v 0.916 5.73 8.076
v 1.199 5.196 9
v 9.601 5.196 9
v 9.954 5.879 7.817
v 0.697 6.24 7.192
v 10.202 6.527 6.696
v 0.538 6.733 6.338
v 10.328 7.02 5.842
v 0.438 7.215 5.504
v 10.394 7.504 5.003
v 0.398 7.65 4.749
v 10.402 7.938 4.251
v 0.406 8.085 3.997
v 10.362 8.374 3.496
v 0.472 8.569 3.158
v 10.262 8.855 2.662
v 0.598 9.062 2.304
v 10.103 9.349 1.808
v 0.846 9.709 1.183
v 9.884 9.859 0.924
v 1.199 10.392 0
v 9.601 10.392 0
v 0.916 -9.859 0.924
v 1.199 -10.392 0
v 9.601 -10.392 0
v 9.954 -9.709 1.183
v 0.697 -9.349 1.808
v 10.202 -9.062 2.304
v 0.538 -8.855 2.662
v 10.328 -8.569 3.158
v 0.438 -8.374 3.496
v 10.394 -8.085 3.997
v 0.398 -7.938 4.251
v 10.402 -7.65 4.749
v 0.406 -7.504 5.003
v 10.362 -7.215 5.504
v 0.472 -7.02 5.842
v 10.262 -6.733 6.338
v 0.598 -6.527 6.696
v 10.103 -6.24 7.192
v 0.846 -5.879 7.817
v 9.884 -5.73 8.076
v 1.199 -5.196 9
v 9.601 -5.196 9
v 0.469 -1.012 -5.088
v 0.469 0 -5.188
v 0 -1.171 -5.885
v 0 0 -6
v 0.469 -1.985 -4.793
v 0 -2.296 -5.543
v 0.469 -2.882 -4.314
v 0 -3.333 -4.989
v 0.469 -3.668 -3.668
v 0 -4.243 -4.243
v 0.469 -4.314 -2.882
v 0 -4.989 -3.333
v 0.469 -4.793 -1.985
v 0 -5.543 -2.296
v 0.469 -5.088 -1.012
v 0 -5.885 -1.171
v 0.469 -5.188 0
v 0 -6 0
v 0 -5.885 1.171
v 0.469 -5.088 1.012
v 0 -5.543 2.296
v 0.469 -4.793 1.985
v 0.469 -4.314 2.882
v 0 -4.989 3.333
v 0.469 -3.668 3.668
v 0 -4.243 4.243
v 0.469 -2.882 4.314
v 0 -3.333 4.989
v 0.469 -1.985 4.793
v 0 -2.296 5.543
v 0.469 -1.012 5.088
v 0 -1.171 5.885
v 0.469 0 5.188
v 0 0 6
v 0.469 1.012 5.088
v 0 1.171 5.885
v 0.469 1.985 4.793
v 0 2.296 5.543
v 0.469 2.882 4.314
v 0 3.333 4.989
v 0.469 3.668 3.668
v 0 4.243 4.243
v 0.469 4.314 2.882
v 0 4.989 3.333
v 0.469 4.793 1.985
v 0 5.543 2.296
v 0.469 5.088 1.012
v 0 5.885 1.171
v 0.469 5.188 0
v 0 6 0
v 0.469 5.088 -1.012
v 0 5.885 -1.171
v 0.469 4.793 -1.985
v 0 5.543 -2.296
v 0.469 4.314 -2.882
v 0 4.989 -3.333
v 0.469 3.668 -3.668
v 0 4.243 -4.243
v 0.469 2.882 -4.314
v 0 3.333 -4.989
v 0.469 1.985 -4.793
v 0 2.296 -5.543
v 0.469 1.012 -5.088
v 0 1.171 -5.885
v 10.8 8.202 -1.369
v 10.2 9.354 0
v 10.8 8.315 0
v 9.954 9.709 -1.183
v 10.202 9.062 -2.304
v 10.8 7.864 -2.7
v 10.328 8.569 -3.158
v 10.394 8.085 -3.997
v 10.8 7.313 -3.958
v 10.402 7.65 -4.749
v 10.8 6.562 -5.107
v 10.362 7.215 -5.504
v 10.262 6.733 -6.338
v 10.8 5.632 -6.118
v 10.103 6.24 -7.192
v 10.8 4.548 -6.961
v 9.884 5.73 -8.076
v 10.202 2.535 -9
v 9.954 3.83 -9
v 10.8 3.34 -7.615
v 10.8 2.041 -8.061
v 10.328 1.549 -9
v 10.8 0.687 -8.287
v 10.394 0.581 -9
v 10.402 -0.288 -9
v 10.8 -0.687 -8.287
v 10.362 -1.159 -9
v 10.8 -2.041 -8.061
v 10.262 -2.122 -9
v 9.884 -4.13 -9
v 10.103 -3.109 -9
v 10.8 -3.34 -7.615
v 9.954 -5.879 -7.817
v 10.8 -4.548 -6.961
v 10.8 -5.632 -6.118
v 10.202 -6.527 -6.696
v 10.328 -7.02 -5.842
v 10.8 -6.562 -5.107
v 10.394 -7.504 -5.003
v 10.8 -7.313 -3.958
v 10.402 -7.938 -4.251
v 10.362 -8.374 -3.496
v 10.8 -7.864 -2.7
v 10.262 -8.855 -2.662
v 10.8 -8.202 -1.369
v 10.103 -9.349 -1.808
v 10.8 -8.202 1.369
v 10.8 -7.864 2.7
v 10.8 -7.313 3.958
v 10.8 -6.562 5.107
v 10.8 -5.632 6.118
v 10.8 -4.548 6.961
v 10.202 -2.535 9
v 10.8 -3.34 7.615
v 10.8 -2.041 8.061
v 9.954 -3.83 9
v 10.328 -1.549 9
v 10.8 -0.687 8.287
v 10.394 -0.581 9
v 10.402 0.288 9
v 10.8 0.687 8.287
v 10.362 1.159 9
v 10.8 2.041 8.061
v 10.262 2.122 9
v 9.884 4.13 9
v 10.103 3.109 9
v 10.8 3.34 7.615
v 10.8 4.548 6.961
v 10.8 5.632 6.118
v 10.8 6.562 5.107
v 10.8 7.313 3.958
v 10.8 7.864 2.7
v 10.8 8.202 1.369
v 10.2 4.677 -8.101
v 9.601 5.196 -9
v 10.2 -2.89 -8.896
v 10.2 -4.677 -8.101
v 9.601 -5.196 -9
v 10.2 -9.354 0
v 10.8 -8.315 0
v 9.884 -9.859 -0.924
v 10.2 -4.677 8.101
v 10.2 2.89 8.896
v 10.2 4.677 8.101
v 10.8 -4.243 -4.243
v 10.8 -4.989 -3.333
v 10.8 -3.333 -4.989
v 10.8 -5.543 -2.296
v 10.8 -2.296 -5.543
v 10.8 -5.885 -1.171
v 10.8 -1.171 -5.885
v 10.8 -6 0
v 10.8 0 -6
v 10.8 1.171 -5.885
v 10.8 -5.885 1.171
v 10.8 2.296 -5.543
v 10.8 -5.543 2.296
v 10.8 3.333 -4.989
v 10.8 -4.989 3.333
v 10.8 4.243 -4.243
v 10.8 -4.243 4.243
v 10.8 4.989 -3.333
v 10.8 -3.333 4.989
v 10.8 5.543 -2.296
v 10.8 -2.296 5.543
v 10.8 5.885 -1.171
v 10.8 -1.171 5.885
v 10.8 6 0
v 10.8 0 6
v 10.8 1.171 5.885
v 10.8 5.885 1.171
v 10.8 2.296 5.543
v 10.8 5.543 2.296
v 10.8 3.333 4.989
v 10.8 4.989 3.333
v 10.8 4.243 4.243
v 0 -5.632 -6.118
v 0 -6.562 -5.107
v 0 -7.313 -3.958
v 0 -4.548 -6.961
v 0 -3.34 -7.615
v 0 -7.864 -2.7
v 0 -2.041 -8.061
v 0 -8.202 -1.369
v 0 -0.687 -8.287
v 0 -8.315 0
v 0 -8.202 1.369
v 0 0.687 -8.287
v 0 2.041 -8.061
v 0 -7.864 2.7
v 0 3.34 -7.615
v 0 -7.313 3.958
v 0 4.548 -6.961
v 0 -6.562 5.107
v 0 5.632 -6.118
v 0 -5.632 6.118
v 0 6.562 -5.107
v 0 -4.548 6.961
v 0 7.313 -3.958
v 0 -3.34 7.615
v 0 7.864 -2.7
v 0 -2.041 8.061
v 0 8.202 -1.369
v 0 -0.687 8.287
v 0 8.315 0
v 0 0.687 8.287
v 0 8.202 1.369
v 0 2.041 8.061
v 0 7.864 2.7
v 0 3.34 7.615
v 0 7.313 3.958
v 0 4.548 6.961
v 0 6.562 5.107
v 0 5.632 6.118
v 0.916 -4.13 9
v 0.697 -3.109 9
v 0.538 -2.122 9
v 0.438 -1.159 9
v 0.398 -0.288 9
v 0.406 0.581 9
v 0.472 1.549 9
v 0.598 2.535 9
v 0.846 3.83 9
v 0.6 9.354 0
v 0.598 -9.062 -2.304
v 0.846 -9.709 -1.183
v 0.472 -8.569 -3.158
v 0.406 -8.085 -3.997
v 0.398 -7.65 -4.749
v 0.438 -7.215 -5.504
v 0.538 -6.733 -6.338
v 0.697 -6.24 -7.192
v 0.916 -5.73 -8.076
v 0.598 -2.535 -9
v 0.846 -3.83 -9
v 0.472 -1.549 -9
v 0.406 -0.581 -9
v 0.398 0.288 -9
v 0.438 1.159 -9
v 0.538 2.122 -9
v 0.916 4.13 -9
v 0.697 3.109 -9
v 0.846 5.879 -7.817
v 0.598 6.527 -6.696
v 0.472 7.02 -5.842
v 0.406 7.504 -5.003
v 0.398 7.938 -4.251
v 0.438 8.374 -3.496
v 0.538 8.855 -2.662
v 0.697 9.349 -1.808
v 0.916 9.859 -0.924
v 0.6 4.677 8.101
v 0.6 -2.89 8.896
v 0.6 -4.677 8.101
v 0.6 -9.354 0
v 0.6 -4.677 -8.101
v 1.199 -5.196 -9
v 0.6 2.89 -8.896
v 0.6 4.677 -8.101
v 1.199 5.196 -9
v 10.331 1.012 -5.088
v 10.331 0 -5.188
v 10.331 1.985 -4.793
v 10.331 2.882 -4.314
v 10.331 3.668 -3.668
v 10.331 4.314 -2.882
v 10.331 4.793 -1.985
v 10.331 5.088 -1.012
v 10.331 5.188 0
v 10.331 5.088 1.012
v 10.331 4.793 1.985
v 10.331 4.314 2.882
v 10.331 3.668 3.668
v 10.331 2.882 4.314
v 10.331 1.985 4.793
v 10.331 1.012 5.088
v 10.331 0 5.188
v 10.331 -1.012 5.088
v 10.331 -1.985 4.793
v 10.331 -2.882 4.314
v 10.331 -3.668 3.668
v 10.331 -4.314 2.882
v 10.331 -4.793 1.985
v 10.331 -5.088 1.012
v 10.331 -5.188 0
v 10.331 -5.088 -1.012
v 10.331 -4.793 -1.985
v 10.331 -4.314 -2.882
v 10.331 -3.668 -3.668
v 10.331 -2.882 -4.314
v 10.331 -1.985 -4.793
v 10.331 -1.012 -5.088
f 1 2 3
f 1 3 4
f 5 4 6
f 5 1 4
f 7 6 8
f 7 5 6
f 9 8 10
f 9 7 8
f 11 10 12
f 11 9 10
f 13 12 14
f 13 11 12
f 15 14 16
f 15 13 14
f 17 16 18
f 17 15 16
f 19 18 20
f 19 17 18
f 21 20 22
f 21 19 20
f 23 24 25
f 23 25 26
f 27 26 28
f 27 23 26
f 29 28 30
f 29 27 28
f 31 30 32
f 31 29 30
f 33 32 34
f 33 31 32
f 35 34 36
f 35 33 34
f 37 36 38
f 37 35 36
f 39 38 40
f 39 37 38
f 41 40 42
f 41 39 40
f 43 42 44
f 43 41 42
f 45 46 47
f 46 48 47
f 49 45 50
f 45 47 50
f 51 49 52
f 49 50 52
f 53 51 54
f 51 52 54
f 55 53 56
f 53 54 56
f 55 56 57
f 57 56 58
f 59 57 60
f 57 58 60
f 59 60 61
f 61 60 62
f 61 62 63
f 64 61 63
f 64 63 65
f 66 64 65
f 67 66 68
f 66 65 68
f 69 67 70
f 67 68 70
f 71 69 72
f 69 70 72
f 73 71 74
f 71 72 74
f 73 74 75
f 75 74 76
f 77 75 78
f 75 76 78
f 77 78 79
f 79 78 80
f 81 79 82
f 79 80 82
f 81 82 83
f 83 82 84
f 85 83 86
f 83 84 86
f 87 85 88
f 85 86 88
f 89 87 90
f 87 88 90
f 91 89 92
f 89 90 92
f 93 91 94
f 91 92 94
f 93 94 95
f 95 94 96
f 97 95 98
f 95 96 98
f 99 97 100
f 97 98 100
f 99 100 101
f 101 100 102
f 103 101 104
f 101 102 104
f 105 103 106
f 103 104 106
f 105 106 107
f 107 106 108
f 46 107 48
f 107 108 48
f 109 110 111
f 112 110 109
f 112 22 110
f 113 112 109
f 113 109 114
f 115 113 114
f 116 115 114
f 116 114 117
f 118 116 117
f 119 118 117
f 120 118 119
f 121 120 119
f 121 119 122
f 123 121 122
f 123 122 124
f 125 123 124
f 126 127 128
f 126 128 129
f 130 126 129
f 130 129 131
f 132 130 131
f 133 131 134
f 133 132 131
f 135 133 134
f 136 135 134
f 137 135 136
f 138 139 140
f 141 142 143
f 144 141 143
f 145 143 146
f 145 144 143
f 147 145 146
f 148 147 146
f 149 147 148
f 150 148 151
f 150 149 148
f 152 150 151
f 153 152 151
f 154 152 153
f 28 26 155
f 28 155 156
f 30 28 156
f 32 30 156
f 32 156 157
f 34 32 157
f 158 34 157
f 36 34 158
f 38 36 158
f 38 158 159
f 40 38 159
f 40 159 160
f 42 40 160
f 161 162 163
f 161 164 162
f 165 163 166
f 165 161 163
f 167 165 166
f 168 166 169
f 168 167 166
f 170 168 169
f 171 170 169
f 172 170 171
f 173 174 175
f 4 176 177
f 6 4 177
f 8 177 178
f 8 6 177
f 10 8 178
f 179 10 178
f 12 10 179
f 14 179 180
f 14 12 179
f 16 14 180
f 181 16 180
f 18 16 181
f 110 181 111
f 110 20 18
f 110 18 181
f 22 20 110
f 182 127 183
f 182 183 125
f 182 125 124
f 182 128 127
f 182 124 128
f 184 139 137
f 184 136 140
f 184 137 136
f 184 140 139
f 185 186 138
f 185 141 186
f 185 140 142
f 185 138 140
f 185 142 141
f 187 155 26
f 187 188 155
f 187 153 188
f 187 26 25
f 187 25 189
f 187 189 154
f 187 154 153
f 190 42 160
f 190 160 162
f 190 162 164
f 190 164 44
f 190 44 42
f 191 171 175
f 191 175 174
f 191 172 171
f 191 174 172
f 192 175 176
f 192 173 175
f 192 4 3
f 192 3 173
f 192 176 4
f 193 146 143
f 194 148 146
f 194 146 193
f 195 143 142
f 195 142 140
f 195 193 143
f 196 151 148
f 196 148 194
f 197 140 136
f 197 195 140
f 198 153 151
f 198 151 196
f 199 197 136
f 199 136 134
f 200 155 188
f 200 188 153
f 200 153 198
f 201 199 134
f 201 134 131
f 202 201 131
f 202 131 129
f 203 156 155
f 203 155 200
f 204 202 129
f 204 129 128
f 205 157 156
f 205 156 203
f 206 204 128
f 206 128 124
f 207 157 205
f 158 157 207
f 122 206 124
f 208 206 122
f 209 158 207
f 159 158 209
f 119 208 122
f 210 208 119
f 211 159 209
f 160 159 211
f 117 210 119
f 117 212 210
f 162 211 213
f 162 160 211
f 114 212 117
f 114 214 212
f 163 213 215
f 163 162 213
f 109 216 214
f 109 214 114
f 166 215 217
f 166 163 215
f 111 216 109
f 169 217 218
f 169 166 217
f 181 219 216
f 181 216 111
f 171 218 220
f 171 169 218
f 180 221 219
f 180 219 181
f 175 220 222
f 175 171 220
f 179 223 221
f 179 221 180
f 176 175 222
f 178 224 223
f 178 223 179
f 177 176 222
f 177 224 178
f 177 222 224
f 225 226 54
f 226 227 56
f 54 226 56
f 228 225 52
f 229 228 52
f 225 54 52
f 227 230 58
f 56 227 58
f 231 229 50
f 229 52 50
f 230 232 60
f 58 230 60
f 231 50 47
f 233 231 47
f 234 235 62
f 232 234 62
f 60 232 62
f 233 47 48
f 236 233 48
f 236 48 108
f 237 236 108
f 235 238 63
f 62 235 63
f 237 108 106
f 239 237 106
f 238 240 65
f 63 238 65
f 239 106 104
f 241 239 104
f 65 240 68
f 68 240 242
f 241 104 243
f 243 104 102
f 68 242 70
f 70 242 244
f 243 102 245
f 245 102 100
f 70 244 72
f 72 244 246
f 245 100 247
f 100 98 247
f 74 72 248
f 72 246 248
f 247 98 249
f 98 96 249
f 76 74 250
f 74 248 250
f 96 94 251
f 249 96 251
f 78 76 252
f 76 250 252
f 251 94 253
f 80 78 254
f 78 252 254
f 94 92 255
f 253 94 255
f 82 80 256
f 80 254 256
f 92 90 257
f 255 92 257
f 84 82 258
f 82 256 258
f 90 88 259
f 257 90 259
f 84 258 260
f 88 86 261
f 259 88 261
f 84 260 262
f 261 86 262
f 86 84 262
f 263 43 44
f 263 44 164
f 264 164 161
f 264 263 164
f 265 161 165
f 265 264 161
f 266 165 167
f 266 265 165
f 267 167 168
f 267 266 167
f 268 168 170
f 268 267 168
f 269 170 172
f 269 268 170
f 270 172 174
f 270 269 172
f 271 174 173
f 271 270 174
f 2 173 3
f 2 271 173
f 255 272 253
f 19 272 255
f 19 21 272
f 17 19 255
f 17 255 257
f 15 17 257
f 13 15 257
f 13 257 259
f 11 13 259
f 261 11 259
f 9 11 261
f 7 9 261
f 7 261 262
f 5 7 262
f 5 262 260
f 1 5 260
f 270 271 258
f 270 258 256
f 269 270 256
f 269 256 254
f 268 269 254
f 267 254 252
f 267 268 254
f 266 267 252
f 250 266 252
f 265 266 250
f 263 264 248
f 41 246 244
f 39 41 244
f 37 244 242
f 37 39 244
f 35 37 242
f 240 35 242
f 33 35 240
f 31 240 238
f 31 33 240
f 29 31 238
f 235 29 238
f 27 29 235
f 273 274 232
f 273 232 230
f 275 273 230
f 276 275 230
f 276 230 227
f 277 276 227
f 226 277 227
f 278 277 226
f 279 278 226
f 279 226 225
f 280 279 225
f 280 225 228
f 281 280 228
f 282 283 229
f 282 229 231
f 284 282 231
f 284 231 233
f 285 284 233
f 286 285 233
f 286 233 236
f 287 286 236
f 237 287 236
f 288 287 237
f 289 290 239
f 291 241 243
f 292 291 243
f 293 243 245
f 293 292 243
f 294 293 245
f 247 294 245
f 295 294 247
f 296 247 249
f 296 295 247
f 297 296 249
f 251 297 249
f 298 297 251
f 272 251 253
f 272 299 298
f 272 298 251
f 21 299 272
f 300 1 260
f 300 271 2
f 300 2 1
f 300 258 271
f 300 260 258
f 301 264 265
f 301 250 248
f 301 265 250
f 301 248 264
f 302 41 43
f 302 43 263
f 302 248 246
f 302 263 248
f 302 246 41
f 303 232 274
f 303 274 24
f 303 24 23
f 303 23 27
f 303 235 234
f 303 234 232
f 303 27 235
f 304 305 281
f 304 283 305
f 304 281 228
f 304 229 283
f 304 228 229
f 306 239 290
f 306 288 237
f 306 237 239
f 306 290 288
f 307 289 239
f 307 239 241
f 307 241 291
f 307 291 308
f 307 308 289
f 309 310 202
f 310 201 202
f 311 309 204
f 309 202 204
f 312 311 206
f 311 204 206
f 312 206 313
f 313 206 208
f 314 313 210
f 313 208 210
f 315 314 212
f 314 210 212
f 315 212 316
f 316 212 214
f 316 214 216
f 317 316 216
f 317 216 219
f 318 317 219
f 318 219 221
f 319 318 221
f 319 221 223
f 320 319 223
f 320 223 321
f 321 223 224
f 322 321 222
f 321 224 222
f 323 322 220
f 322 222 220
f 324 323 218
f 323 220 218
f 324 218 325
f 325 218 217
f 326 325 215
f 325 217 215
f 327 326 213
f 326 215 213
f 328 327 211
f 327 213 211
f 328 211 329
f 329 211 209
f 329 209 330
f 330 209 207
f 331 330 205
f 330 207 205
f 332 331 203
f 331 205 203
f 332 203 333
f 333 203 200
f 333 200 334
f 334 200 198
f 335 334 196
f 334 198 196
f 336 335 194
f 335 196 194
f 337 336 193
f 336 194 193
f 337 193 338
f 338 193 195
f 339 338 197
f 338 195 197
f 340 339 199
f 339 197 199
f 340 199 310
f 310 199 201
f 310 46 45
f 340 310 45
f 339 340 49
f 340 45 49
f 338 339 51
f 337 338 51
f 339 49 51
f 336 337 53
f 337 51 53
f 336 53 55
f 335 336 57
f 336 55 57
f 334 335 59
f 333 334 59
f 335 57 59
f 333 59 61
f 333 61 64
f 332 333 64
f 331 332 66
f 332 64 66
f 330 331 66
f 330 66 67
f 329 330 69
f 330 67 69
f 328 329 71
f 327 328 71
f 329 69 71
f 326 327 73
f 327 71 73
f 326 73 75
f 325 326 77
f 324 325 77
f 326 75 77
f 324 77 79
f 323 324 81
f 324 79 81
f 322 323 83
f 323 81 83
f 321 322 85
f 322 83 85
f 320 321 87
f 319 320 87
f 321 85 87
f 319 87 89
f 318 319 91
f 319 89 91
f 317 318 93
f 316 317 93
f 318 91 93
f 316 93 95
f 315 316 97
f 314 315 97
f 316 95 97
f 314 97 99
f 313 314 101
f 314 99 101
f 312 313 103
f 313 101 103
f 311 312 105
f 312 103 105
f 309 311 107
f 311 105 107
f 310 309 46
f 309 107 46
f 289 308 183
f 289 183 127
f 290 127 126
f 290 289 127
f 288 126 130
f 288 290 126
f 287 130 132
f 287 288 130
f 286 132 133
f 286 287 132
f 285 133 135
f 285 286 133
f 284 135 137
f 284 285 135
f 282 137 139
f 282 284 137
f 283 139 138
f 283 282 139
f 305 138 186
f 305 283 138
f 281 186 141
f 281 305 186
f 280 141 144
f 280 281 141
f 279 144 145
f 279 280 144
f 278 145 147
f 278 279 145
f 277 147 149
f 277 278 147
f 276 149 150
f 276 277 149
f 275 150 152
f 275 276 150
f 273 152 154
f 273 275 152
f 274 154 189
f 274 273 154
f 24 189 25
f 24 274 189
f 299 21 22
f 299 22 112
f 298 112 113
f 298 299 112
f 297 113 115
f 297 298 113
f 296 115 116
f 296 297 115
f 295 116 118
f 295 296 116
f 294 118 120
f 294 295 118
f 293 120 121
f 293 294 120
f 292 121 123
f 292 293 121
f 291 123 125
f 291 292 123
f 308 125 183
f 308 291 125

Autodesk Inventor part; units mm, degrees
ref_plane "YZ Plane" through (0, 0, 0) normal (1, 0, 0) x (0, 1, 0)
ref_plane "XZ Plane" through (0, 0, 0) normal (0, 1, 0) x (-1, 0, 0)
sketch "Эскиз1" plane through (0, 0, 0) normal (1, 0, 0) x (0, 1, 0)
  line L0 (-10.3923, 0) -> (-5.1962, 9)
  line L1 (-5.1962, 9) -> (5.1962, 9)
  line L2 (5.1962, 9) -> (10.3923, 0)
  line L3 (10.3923, 0) -> (5.1962, -9)
  line L4 (5.1962, -9) -> (-5.1962, -9)
  line L5 (-5.1962, -9) -> (-10.3923, 0)
  point P0 (0, 0)
  point P1 (0, 0)
  dimension "d0" = 20.7846
extrude "Базовый элемент" add sketch "Эскиз1" along normal blind 10.8
sketch "Эскиз2" plane through (0, 0, 0) normal (0, 0, 1) x (1, 0, 0)
  line L0 (0, 5.1962) -> (0, 10.3923) projected
  line L1 (0, 10.3923) -> (10.8, 10.3923) projected
  line L2 (10.8, 5.1962) -> (10.8, 10.3923) projected
  line L3 (-2.16, 0) -> (12.96, 0) projected
  line L4 (1.1993, 10.3923) -> (0, 8.315)
  line L5 (9.6007, 10.3923) -> (10.8, 8.315)
  dimension "d3" = 30
  dimension "d4" = 30
  dimension "d5" = 16.63
  dimension "d6" = 16.63
revolve "Фаска1" cut sketch "Эскиз2" angle 360 about axis through (-10, 0, 0) along (1, 0, 0)
sketch "Эскиз3" plane through (10.8, 0, 0) normal (1, 0, 0) x (0, 0, -1)
  arc A0 (-0.625, -1.0825) -> (0.625, -1.0825) centre (0, 0) ccw projected
hole "Резьба" at (10.8, 0, 0) direction (-1, 0, 0) diameter 10.376 end through all thread size "M12x1.5" class "6H" standard "ISO Metric profile"
chamfer "Фаска2" distance 0.8119 angle 30 1 edges at (10.8, 0, 5.188) measured on face at (10.8, 7.1795, -0.8718)
chamfer "Фаска3" distance 0.8119 angle 30 1 edges at (0, 0, 5.188) measured on face at (0, 7.1795, -0.8718)
ref_plane "Work Plane1" through (-18.9656, 0, 0) normal (0, -0.8660254, -0.5) x (1, 0, 0)
equation "\"d0\" = 1.1547 * SW"
equation "\"d1\" = KOH"
equation "\"d3\" = ANG1"
equation "\"d4\" = ANG2"
equation "\"d5\" = SW0"
equation "\"d6\" = SW01"
equation "\"d8\" = -0.5 * GD1 + 0.5 * NND"
equation "\"d40\" = -0.5 * GD1 + 0.5 * NND"
equation "\"d10\" = -0.5 * GD1 + 0.5 * NND"
equation "\"d41\" = -0.5 * GD1 + 0.5 * NND"
equation "\"ANG1\" = 30deg"
equation "\"ANG2\" = 30deg"
equation "\"NND\" = 12"
equation "\"KOH\" = 10.8"
equation "\"SW\" = 18"
equation "\"SW0\" = 16.63"
equation "\"SW01\" = SW0"
equation "\"GUL\" = 0.541266 * PTC"
equation "\"LADI\" = 12.345"
equation "\"TOA\" = 30deg"
equation "\"FAWI\" = 30deg"
equation "\"PTC\" = 1.5"
equation "\"THREADDIA\" = 12"
equation "\"E0\" = 1.155 * SW"
equation "\"GAL\" = 0.541266 * PTC"
equation "\"GD1\" = 10.376202"
properties part number "Копия гайки M12x1.5-6H ГОСТ 5915-70" material "Сталь, мягкая"
